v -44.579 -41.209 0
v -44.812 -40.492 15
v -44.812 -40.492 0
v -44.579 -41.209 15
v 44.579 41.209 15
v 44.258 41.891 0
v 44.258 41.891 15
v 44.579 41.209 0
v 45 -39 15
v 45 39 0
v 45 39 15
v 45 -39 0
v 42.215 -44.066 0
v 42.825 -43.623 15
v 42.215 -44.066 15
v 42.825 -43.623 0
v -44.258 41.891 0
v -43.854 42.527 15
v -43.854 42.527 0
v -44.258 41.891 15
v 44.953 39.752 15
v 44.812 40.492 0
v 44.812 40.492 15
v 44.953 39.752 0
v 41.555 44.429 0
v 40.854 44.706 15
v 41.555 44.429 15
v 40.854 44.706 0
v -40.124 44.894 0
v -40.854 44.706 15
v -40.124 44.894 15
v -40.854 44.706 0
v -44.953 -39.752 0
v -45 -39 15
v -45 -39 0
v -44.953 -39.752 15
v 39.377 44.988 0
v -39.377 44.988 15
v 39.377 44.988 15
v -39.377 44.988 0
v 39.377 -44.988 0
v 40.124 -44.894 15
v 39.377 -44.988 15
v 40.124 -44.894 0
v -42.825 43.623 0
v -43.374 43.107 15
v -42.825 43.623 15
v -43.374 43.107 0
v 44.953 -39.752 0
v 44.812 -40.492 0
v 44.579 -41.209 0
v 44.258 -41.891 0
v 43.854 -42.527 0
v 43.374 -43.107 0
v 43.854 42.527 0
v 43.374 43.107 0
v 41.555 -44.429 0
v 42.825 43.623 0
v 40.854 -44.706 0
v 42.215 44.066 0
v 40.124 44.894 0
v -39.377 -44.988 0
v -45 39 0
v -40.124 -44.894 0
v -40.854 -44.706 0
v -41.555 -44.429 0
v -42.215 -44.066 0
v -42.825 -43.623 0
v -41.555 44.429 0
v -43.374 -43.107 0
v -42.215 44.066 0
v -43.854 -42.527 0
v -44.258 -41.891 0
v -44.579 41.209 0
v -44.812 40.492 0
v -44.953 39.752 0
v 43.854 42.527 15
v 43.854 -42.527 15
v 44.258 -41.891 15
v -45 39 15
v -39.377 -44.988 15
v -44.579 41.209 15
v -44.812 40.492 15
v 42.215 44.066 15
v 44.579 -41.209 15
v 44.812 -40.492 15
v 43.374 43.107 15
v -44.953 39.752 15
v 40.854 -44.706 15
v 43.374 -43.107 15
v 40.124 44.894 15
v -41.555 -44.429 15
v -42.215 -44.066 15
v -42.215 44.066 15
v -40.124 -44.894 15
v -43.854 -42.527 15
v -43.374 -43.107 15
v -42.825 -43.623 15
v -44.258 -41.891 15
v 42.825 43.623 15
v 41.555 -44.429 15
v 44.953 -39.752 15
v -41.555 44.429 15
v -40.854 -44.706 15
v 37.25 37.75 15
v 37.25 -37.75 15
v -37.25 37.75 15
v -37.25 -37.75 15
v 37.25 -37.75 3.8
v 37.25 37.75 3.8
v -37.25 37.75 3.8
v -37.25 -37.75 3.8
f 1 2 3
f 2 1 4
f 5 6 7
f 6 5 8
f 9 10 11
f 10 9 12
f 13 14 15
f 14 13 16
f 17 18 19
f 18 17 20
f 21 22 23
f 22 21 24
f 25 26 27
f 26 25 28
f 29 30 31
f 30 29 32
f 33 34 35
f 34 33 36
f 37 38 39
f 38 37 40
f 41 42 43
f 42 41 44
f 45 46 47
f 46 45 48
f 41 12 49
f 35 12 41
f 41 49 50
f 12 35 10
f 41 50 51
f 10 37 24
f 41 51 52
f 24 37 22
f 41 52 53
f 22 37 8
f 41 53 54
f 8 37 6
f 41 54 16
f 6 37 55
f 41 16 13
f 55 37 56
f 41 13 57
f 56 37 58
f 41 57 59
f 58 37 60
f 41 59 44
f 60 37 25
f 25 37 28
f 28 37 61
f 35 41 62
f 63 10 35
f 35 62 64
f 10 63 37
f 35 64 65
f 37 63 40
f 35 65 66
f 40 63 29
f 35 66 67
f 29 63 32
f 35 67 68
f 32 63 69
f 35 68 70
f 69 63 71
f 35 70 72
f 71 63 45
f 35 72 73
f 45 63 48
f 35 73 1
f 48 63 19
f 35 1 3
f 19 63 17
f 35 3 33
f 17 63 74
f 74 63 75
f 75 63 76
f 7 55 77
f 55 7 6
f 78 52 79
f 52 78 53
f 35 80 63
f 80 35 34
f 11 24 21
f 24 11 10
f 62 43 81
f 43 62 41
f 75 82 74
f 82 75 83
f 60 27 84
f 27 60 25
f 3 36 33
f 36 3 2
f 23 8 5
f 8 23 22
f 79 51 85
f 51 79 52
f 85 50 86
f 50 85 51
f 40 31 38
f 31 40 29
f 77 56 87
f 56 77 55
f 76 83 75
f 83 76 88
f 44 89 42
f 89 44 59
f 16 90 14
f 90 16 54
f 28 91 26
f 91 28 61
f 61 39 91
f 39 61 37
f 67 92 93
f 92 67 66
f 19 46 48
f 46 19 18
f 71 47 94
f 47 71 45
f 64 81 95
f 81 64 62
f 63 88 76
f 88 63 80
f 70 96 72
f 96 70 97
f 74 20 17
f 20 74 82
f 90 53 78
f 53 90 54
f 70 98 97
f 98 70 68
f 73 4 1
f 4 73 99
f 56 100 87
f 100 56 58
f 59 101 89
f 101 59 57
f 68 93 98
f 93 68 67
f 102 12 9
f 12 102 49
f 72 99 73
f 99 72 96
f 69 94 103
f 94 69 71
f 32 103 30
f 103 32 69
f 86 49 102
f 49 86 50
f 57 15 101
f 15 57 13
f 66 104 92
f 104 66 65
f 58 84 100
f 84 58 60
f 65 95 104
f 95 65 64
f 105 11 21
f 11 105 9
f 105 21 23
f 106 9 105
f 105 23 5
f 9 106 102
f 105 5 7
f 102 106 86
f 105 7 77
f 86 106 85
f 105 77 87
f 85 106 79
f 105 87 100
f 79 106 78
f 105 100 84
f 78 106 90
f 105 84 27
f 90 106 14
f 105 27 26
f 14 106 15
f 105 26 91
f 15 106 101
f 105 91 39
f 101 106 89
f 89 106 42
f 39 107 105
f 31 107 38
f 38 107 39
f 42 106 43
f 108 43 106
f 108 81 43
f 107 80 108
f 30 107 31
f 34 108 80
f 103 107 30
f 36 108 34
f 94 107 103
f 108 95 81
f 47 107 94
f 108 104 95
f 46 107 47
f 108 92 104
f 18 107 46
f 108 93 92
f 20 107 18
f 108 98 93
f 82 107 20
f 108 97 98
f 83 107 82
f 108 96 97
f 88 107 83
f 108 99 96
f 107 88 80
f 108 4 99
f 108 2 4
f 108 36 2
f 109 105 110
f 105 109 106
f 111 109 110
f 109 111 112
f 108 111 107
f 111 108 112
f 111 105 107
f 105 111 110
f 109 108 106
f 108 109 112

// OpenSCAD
//CUSTOMIZER VARIABLES

// width of coaster
coaster_size_x=90;

// length of coaster
coaster_size_y=90;

// height of coaster
coaster_height=15;

// radius of coaster corner
coaster_corner_r=6;

// widith of hole
inset_size_x=74.5;

// length of hole
inset_size_y=75.5;

// height of hole
inset_height=3.8;

// make little holes in bottom for inserting rubber feet or cork circles
do_feet = 0; // [0:no, 1:yes]

// height of foot hole divided by two
feet_height_div2=3.2;

// radius of foot hole
feet_radius=3.5;

//CUSTOMIZER VARIABLES END


module roundedRect(size, radius)
{
x = size[0];
y = size[1];
z = size[2];

linear_extrude(height=z)
//union()
hull()
{
// place 4 circles in the corners, with the given radius
translate([(-x/2)+(radius), (-y/2)+(radius), 0])
circle(r=radius,$fn=50);

translate([(x/2)-(radius), (-y/2)+(radius), 0])
circle(r=radius,$fn=50);

translate([(-x/2)+(radius), (y/2)-(radius), 0])
circle(r=radius,$fn=50);

translate([(x/2)-(radius), (y/2)-(radius), 0])
circle(r=radius,$fn=50);
}
}

difference() {
roundedRect([coaster_size_x,coaster_size_y,coaster_height],coaster_corner_r);
translate([-inset_size_x/2,-inset_size_y/2,inset_height]) cube(size=[inset_size_x,inset_size_y,coaster_height]);

if (do_feet) {
translate([coaster_size_x*3.4/8,coaster_size_y*3.4/8,-0.1]) cylinder(r=feet_radius,h=feet_height_div2,$fn=50);
translate([-coaster_size_x*3.4/8,coaster_size_y*3.4/8,-0.1]) cylinder(r=feet_radius,h=feet_height_div2,$fn=50);
translate([coaster_size_x*3.4/8,-coaster_size_y*3.4/8,-0.1]) cylinder(r=feet_radius,h=feet_height_div2,$fn=50);
translate([-coaster_size_x*3.4/8,-coaster_size_y*3.4/8,-0.1]) cylinder(r=feet_radius,h=feet_height_div2,$fn=50);
}
}
